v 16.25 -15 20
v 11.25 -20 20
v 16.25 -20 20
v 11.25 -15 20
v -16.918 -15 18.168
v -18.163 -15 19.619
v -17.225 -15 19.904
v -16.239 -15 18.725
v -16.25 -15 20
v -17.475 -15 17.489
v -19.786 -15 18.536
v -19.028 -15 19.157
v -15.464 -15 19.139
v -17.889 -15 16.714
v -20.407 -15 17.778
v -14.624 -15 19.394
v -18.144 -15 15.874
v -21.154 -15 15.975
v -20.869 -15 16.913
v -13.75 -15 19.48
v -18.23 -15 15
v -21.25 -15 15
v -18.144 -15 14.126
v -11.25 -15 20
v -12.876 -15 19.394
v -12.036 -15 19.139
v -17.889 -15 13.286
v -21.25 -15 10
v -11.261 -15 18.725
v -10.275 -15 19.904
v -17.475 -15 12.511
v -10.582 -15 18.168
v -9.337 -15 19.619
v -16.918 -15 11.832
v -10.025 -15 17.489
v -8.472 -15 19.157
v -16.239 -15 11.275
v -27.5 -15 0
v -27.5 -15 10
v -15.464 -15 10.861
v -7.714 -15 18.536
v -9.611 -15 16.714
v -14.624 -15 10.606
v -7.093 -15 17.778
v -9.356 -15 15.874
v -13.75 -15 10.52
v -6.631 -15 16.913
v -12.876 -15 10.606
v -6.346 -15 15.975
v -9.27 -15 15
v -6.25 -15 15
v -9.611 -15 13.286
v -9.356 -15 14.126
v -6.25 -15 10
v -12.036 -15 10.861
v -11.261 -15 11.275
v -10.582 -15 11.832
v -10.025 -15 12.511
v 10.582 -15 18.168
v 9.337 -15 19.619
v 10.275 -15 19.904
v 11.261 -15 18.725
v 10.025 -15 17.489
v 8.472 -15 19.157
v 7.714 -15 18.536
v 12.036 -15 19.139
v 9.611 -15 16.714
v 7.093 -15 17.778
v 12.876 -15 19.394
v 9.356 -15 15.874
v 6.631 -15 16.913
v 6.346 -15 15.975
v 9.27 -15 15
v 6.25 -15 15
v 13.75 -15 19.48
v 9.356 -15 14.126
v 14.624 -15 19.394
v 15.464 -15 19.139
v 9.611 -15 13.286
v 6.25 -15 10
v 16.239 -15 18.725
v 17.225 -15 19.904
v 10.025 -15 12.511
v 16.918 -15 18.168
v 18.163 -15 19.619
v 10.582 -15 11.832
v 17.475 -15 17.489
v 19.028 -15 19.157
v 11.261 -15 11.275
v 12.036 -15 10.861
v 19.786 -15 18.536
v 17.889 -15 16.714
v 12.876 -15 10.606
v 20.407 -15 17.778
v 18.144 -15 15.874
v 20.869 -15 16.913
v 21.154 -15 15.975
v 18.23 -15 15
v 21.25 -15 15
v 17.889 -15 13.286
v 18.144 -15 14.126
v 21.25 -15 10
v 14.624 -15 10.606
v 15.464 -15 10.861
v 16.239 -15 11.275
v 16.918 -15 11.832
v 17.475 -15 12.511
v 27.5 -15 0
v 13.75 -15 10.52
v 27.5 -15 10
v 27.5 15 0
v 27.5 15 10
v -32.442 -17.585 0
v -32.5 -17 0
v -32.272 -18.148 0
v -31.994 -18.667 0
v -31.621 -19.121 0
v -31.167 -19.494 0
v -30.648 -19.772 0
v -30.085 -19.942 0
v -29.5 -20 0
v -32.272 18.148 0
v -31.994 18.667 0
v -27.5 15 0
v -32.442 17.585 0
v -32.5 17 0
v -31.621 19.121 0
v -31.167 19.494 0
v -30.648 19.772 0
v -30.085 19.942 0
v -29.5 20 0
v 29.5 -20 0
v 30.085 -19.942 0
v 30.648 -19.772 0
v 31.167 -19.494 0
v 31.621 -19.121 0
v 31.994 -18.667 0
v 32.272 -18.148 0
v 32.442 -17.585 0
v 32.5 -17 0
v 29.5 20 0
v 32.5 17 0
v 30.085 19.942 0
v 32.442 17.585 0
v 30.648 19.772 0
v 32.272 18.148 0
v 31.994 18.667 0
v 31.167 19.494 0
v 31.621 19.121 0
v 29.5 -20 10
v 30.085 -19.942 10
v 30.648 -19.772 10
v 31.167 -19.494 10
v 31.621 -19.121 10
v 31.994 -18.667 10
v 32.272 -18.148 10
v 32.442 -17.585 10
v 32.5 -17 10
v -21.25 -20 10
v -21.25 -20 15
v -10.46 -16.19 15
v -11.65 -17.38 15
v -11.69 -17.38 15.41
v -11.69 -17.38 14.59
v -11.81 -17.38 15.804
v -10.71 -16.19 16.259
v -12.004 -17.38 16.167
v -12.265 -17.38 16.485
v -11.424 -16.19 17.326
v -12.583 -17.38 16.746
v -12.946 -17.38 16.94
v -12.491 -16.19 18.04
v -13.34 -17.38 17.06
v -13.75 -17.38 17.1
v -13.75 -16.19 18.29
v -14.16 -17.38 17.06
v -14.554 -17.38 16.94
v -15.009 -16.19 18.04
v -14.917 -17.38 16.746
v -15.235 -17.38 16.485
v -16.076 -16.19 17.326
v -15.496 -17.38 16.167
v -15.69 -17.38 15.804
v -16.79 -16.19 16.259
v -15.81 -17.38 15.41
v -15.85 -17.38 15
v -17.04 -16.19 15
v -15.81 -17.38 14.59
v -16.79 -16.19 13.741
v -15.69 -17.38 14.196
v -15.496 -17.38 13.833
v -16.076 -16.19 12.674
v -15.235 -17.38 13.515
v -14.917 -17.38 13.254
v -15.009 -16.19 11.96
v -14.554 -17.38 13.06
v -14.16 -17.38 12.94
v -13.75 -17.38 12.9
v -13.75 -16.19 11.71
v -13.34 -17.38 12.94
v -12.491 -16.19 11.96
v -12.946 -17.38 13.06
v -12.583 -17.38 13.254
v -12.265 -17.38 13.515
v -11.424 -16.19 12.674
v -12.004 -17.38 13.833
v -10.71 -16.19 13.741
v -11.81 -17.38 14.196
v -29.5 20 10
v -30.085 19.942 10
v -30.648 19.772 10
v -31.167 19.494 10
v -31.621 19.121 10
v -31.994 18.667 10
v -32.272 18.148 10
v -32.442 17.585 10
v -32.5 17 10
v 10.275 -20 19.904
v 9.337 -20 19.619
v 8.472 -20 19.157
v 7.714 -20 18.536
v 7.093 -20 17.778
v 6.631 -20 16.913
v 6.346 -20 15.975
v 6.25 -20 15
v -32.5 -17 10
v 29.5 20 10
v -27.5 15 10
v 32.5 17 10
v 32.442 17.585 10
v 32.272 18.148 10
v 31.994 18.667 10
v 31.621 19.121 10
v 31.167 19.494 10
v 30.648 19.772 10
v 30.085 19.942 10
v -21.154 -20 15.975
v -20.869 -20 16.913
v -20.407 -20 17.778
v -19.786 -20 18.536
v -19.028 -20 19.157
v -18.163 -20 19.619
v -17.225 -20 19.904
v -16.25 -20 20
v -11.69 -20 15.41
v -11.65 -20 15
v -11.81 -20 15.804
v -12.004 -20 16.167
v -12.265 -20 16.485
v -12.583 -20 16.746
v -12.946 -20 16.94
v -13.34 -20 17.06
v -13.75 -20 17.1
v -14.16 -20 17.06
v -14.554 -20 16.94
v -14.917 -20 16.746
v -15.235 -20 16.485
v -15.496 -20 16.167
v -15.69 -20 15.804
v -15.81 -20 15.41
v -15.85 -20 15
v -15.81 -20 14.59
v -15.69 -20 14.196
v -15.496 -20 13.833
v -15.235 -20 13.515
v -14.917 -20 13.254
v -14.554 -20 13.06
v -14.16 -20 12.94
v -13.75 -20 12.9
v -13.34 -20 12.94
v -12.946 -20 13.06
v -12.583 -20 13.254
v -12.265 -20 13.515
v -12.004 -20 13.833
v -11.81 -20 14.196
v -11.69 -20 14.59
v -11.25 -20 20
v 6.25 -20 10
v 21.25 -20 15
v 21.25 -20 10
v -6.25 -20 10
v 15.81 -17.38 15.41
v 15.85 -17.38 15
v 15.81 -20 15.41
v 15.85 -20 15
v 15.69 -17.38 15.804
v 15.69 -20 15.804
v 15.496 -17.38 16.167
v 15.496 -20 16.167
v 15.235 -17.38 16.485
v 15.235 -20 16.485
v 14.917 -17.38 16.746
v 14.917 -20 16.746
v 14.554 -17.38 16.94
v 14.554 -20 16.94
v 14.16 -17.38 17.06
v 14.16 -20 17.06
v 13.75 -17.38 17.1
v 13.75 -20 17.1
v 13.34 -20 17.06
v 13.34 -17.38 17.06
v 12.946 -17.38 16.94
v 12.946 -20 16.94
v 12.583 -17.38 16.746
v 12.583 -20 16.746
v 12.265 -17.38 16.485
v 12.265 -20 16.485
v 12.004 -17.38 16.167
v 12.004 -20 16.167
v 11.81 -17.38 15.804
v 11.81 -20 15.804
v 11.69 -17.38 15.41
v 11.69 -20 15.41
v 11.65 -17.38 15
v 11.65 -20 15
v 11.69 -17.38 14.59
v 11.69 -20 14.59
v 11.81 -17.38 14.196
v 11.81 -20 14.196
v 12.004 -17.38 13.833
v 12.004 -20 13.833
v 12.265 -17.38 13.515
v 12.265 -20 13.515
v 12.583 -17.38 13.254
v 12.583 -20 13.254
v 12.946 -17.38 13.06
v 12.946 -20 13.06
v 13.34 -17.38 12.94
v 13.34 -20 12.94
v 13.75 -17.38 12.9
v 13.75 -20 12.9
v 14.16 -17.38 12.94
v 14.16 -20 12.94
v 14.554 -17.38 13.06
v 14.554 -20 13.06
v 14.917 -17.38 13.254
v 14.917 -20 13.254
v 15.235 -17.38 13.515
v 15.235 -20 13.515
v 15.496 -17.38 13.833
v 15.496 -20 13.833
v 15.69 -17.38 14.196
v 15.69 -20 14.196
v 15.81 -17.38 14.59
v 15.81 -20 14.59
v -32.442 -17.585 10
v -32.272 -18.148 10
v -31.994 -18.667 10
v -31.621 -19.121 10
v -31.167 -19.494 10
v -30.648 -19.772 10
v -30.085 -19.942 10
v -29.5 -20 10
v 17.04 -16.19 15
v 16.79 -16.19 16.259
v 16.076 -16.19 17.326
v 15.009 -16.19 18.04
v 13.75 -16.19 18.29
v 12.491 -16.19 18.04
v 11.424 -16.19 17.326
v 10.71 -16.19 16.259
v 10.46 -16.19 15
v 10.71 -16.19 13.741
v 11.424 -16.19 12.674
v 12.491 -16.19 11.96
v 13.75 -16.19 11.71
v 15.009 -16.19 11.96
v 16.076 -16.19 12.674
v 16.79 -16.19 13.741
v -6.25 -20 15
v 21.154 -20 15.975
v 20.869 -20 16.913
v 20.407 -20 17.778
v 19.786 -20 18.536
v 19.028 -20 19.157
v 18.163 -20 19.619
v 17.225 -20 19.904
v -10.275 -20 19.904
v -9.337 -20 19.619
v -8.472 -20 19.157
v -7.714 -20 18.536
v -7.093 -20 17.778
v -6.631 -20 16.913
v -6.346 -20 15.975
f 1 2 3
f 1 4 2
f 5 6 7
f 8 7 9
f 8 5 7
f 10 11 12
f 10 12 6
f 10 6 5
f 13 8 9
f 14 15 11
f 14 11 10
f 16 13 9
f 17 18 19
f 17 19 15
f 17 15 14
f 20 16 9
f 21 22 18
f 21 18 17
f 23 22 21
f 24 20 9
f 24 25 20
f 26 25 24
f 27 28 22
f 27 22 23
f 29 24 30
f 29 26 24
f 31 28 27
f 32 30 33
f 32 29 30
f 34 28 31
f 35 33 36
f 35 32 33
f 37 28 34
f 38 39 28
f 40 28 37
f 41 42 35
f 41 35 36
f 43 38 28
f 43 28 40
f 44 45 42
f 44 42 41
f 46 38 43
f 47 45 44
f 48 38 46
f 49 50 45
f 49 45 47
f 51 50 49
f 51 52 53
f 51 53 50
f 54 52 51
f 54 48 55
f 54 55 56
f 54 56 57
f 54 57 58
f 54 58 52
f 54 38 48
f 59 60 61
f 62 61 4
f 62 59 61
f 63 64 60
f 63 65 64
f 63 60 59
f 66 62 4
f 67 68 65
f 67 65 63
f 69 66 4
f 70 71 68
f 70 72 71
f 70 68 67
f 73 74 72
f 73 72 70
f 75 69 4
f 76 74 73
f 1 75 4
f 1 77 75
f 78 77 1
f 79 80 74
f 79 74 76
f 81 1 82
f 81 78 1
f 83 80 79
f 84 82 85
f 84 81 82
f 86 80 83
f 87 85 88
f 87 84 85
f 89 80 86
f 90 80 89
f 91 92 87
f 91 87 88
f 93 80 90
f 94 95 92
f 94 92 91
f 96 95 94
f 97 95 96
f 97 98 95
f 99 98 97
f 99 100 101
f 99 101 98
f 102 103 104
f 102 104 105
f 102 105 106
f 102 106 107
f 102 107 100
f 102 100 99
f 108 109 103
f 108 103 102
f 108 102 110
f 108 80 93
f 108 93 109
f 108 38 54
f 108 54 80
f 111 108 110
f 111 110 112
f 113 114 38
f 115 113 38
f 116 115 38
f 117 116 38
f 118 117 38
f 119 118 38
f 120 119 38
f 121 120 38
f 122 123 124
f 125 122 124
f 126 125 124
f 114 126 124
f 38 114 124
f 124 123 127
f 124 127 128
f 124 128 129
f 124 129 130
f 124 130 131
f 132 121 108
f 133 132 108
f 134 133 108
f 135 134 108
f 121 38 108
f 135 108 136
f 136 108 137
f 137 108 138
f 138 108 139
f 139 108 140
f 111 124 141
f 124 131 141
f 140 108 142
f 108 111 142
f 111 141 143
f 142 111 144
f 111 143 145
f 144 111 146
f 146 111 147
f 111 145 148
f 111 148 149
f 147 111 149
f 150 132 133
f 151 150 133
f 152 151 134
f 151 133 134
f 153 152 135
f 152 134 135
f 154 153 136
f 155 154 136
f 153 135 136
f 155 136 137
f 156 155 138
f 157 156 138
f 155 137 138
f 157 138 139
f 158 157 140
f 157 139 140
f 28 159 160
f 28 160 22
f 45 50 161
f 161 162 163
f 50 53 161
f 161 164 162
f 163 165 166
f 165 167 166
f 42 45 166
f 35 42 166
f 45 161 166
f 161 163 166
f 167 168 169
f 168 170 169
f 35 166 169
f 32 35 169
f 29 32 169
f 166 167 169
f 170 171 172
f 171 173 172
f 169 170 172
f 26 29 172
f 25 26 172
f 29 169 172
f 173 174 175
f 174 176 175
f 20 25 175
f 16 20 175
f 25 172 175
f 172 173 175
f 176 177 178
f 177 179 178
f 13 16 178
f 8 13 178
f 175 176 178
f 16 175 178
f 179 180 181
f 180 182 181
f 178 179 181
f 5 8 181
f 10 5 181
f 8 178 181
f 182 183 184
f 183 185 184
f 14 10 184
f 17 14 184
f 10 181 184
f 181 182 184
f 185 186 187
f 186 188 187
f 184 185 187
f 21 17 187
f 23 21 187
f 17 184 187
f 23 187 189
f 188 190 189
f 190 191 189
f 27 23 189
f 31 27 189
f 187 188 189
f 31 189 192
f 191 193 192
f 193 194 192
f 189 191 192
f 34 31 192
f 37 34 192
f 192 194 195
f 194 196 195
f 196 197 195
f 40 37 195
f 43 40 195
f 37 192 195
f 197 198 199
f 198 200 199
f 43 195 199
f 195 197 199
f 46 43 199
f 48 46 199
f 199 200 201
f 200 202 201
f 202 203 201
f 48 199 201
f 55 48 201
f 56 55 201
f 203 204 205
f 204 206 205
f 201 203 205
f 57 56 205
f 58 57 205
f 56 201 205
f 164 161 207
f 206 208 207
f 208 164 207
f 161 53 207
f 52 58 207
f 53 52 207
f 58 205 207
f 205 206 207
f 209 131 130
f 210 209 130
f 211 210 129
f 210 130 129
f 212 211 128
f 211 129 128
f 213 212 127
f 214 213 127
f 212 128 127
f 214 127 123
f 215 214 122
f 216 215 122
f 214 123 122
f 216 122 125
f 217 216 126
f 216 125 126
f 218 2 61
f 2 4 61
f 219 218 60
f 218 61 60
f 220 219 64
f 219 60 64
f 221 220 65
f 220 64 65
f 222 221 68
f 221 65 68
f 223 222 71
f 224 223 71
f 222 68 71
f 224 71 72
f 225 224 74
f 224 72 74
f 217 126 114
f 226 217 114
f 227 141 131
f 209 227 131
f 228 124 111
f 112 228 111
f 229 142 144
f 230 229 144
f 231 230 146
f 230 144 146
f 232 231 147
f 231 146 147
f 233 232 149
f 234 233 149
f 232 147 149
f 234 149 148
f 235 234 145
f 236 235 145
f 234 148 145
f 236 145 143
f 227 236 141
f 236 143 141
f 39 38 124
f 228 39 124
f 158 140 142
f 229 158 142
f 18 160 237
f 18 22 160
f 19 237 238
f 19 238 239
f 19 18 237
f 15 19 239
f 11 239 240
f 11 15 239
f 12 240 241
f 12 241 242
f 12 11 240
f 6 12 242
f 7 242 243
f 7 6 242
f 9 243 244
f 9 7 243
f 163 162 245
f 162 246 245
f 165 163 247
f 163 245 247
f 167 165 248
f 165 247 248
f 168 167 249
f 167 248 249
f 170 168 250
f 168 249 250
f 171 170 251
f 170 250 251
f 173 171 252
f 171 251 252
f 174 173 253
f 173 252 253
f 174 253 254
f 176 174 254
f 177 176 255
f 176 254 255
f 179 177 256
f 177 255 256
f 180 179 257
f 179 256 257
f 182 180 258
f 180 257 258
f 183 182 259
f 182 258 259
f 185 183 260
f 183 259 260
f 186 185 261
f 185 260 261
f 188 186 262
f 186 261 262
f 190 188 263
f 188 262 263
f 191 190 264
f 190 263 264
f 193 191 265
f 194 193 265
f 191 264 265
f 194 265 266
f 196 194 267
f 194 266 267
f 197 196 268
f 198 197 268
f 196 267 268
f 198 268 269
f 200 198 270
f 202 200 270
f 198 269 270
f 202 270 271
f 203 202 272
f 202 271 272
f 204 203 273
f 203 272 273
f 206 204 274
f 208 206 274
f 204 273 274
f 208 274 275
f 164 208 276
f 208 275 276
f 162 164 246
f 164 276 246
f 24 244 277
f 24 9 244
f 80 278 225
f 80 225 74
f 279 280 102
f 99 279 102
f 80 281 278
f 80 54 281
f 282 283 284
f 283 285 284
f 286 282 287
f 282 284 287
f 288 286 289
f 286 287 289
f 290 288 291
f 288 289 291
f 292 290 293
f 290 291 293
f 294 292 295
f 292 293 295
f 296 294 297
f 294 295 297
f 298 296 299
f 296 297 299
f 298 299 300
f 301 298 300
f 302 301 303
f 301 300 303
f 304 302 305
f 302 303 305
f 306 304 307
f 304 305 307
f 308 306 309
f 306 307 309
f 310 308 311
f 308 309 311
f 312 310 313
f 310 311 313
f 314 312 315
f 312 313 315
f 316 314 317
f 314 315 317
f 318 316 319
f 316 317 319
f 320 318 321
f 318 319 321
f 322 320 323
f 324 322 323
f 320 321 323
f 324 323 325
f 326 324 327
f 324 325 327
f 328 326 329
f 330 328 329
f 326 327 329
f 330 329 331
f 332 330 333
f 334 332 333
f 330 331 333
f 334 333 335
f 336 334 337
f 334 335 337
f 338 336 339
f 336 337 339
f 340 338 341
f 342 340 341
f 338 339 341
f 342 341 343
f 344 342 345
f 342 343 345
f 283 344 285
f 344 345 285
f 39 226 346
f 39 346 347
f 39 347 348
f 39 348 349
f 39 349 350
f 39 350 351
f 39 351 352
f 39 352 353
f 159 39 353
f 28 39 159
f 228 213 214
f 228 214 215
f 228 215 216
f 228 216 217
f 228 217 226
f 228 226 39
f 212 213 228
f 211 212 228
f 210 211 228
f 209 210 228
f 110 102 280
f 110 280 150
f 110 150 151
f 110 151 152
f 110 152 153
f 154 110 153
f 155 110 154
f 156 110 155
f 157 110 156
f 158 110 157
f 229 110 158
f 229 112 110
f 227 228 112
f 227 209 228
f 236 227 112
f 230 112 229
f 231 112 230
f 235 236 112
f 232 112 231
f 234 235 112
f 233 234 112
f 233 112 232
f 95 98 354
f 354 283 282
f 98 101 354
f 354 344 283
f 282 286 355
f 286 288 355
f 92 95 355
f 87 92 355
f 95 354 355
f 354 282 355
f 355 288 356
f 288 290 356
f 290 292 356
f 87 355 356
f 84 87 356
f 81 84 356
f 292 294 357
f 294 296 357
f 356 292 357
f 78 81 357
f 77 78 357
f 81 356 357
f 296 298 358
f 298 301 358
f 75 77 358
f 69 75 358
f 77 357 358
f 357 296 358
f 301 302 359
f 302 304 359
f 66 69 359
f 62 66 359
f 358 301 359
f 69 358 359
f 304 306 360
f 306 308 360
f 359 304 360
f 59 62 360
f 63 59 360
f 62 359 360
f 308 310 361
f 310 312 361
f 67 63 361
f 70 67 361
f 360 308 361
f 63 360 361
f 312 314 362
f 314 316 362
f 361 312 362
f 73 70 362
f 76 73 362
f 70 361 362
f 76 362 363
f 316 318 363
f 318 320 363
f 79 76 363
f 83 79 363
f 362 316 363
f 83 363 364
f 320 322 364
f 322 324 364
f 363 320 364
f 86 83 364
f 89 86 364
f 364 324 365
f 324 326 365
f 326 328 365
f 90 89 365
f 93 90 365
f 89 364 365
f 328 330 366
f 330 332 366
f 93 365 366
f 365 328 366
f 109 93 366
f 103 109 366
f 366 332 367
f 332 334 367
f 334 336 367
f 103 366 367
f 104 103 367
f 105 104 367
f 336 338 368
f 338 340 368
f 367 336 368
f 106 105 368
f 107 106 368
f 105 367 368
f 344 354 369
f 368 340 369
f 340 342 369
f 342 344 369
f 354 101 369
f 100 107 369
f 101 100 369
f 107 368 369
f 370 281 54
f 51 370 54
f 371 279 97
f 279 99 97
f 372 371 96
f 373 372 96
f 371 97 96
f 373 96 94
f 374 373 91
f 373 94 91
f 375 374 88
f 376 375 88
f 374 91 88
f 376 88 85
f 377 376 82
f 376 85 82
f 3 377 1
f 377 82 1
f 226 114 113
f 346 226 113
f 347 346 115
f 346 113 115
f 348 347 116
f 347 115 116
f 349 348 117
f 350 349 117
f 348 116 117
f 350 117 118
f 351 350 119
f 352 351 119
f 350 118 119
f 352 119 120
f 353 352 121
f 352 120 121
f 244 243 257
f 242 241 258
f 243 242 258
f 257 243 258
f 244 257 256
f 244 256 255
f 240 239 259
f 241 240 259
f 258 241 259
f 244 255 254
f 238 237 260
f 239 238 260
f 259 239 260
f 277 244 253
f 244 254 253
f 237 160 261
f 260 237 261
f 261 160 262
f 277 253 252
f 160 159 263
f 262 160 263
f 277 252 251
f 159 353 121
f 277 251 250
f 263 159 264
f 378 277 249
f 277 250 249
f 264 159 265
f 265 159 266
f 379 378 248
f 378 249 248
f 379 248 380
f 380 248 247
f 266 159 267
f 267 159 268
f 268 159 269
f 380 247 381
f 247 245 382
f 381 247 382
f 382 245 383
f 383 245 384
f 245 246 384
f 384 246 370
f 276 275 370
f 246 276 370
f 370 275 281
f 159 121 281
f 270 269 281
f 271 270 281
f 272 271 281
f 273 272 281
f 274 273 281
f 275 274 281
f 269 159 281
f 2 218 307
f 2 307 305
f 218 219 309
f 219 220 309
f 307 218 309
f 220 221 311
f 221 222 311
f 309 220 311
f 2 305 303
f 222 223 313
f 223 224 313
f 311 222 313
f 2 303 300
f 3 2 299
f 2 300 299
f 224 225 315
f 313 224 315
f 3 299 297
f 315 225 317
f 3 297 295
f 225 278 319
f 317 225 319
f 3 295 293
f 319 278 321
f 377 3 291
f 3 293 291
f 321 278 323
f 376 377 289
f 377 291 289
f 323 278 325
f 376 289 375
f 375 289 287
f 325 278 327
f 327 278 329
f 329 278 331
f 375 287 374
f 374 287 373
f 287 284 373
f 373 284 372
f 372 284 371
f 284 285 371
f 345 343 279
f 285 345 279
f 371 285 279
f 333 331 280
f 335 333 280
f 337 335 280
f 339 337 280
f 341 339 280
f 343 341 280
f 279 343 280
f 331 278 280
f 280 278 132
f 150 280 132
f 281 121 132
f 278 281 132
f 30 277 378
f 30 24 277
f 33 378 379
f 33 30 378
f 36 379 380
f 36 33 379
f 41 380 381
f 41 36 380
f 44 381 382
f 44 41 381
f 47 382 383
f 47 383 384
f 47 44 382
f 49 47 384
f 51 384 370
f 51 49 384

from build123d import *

# Parameters (mm, degrees)
F0_W           = 55
F0_H           = 30
F1_DEPTH       = 10
F2_W           = 15
F2_H           = 5
F3_DEPTH       = 10
F4_R           = 5
F6_D           = 4.2
F6_CSINK_D     = 8.96
F6_CSINK_ANGLE = 90


with BuildPart() as f1:
    # F0 (on Top) → F1 (new body)
    with BuildSketch(Plane.XY):
        with BuildLine():
            Line((29.5, 20), (-29.5, 20))
            ThreePointArc((-29.5, 20), (-31.62132, 19.12132), (-32.5, 17))
            Line((-32.5, 17), (-32.5, -17))
            ThreePointArc((-32.5, -17), (-31.62132, -19.12132), (-29.5, -20))
            Line((-29.5, -20), (29.5, -20))
            ThreePointArc((29.5, -20), (31.62132, -19.12132), (32.5, -17))
            Line((32.5, -17), (32.5, 17))
            ThreePointArc((32.5, 17), (31.62132, 19.12132), (29.5, 20))
        make_face()
        Rectangle(F0_W, F0_H, mode=Mode.SUBTRACT)
    extrude(amount=F1_DEPTH)

    # F2 (on face) → F3 (join)
    with BuildSketch(Plane.XY.offset(10)):
        with Locations((-13.75, -17.5)):
            Rectangle(F2_W, F2_H)
        with Locations((13.75, -17.5)):
            Rectangle(F2_W, F2_H)
    extrude(amount=F3_DEPTH)

    # F4
    f4_edges = [f1.edges().sort_by_distance(p)[0] for p in [
        (-21.25, -17.5, 20),
        (-6.25, -17.5, 20),
        (6.25, -17.5, 20),
        (21.25, -17.5, 20),
    ]]
    fillet(f4_edges, radius=F4_R)

    # F6 (through all)
    with Locations(Plane(origin=(0, -15, 0), x_dir=(-1, 0, 0), z_dir=(0, 1, 0))):
        with Locations((13.75, 15), (-13.75, 15)):
            CounterSinkHole(F6_D / 2, F6_CSINK_D / 2, counter_sink_angle=F6_CSINK_ANGLE)


solid = f1.part
